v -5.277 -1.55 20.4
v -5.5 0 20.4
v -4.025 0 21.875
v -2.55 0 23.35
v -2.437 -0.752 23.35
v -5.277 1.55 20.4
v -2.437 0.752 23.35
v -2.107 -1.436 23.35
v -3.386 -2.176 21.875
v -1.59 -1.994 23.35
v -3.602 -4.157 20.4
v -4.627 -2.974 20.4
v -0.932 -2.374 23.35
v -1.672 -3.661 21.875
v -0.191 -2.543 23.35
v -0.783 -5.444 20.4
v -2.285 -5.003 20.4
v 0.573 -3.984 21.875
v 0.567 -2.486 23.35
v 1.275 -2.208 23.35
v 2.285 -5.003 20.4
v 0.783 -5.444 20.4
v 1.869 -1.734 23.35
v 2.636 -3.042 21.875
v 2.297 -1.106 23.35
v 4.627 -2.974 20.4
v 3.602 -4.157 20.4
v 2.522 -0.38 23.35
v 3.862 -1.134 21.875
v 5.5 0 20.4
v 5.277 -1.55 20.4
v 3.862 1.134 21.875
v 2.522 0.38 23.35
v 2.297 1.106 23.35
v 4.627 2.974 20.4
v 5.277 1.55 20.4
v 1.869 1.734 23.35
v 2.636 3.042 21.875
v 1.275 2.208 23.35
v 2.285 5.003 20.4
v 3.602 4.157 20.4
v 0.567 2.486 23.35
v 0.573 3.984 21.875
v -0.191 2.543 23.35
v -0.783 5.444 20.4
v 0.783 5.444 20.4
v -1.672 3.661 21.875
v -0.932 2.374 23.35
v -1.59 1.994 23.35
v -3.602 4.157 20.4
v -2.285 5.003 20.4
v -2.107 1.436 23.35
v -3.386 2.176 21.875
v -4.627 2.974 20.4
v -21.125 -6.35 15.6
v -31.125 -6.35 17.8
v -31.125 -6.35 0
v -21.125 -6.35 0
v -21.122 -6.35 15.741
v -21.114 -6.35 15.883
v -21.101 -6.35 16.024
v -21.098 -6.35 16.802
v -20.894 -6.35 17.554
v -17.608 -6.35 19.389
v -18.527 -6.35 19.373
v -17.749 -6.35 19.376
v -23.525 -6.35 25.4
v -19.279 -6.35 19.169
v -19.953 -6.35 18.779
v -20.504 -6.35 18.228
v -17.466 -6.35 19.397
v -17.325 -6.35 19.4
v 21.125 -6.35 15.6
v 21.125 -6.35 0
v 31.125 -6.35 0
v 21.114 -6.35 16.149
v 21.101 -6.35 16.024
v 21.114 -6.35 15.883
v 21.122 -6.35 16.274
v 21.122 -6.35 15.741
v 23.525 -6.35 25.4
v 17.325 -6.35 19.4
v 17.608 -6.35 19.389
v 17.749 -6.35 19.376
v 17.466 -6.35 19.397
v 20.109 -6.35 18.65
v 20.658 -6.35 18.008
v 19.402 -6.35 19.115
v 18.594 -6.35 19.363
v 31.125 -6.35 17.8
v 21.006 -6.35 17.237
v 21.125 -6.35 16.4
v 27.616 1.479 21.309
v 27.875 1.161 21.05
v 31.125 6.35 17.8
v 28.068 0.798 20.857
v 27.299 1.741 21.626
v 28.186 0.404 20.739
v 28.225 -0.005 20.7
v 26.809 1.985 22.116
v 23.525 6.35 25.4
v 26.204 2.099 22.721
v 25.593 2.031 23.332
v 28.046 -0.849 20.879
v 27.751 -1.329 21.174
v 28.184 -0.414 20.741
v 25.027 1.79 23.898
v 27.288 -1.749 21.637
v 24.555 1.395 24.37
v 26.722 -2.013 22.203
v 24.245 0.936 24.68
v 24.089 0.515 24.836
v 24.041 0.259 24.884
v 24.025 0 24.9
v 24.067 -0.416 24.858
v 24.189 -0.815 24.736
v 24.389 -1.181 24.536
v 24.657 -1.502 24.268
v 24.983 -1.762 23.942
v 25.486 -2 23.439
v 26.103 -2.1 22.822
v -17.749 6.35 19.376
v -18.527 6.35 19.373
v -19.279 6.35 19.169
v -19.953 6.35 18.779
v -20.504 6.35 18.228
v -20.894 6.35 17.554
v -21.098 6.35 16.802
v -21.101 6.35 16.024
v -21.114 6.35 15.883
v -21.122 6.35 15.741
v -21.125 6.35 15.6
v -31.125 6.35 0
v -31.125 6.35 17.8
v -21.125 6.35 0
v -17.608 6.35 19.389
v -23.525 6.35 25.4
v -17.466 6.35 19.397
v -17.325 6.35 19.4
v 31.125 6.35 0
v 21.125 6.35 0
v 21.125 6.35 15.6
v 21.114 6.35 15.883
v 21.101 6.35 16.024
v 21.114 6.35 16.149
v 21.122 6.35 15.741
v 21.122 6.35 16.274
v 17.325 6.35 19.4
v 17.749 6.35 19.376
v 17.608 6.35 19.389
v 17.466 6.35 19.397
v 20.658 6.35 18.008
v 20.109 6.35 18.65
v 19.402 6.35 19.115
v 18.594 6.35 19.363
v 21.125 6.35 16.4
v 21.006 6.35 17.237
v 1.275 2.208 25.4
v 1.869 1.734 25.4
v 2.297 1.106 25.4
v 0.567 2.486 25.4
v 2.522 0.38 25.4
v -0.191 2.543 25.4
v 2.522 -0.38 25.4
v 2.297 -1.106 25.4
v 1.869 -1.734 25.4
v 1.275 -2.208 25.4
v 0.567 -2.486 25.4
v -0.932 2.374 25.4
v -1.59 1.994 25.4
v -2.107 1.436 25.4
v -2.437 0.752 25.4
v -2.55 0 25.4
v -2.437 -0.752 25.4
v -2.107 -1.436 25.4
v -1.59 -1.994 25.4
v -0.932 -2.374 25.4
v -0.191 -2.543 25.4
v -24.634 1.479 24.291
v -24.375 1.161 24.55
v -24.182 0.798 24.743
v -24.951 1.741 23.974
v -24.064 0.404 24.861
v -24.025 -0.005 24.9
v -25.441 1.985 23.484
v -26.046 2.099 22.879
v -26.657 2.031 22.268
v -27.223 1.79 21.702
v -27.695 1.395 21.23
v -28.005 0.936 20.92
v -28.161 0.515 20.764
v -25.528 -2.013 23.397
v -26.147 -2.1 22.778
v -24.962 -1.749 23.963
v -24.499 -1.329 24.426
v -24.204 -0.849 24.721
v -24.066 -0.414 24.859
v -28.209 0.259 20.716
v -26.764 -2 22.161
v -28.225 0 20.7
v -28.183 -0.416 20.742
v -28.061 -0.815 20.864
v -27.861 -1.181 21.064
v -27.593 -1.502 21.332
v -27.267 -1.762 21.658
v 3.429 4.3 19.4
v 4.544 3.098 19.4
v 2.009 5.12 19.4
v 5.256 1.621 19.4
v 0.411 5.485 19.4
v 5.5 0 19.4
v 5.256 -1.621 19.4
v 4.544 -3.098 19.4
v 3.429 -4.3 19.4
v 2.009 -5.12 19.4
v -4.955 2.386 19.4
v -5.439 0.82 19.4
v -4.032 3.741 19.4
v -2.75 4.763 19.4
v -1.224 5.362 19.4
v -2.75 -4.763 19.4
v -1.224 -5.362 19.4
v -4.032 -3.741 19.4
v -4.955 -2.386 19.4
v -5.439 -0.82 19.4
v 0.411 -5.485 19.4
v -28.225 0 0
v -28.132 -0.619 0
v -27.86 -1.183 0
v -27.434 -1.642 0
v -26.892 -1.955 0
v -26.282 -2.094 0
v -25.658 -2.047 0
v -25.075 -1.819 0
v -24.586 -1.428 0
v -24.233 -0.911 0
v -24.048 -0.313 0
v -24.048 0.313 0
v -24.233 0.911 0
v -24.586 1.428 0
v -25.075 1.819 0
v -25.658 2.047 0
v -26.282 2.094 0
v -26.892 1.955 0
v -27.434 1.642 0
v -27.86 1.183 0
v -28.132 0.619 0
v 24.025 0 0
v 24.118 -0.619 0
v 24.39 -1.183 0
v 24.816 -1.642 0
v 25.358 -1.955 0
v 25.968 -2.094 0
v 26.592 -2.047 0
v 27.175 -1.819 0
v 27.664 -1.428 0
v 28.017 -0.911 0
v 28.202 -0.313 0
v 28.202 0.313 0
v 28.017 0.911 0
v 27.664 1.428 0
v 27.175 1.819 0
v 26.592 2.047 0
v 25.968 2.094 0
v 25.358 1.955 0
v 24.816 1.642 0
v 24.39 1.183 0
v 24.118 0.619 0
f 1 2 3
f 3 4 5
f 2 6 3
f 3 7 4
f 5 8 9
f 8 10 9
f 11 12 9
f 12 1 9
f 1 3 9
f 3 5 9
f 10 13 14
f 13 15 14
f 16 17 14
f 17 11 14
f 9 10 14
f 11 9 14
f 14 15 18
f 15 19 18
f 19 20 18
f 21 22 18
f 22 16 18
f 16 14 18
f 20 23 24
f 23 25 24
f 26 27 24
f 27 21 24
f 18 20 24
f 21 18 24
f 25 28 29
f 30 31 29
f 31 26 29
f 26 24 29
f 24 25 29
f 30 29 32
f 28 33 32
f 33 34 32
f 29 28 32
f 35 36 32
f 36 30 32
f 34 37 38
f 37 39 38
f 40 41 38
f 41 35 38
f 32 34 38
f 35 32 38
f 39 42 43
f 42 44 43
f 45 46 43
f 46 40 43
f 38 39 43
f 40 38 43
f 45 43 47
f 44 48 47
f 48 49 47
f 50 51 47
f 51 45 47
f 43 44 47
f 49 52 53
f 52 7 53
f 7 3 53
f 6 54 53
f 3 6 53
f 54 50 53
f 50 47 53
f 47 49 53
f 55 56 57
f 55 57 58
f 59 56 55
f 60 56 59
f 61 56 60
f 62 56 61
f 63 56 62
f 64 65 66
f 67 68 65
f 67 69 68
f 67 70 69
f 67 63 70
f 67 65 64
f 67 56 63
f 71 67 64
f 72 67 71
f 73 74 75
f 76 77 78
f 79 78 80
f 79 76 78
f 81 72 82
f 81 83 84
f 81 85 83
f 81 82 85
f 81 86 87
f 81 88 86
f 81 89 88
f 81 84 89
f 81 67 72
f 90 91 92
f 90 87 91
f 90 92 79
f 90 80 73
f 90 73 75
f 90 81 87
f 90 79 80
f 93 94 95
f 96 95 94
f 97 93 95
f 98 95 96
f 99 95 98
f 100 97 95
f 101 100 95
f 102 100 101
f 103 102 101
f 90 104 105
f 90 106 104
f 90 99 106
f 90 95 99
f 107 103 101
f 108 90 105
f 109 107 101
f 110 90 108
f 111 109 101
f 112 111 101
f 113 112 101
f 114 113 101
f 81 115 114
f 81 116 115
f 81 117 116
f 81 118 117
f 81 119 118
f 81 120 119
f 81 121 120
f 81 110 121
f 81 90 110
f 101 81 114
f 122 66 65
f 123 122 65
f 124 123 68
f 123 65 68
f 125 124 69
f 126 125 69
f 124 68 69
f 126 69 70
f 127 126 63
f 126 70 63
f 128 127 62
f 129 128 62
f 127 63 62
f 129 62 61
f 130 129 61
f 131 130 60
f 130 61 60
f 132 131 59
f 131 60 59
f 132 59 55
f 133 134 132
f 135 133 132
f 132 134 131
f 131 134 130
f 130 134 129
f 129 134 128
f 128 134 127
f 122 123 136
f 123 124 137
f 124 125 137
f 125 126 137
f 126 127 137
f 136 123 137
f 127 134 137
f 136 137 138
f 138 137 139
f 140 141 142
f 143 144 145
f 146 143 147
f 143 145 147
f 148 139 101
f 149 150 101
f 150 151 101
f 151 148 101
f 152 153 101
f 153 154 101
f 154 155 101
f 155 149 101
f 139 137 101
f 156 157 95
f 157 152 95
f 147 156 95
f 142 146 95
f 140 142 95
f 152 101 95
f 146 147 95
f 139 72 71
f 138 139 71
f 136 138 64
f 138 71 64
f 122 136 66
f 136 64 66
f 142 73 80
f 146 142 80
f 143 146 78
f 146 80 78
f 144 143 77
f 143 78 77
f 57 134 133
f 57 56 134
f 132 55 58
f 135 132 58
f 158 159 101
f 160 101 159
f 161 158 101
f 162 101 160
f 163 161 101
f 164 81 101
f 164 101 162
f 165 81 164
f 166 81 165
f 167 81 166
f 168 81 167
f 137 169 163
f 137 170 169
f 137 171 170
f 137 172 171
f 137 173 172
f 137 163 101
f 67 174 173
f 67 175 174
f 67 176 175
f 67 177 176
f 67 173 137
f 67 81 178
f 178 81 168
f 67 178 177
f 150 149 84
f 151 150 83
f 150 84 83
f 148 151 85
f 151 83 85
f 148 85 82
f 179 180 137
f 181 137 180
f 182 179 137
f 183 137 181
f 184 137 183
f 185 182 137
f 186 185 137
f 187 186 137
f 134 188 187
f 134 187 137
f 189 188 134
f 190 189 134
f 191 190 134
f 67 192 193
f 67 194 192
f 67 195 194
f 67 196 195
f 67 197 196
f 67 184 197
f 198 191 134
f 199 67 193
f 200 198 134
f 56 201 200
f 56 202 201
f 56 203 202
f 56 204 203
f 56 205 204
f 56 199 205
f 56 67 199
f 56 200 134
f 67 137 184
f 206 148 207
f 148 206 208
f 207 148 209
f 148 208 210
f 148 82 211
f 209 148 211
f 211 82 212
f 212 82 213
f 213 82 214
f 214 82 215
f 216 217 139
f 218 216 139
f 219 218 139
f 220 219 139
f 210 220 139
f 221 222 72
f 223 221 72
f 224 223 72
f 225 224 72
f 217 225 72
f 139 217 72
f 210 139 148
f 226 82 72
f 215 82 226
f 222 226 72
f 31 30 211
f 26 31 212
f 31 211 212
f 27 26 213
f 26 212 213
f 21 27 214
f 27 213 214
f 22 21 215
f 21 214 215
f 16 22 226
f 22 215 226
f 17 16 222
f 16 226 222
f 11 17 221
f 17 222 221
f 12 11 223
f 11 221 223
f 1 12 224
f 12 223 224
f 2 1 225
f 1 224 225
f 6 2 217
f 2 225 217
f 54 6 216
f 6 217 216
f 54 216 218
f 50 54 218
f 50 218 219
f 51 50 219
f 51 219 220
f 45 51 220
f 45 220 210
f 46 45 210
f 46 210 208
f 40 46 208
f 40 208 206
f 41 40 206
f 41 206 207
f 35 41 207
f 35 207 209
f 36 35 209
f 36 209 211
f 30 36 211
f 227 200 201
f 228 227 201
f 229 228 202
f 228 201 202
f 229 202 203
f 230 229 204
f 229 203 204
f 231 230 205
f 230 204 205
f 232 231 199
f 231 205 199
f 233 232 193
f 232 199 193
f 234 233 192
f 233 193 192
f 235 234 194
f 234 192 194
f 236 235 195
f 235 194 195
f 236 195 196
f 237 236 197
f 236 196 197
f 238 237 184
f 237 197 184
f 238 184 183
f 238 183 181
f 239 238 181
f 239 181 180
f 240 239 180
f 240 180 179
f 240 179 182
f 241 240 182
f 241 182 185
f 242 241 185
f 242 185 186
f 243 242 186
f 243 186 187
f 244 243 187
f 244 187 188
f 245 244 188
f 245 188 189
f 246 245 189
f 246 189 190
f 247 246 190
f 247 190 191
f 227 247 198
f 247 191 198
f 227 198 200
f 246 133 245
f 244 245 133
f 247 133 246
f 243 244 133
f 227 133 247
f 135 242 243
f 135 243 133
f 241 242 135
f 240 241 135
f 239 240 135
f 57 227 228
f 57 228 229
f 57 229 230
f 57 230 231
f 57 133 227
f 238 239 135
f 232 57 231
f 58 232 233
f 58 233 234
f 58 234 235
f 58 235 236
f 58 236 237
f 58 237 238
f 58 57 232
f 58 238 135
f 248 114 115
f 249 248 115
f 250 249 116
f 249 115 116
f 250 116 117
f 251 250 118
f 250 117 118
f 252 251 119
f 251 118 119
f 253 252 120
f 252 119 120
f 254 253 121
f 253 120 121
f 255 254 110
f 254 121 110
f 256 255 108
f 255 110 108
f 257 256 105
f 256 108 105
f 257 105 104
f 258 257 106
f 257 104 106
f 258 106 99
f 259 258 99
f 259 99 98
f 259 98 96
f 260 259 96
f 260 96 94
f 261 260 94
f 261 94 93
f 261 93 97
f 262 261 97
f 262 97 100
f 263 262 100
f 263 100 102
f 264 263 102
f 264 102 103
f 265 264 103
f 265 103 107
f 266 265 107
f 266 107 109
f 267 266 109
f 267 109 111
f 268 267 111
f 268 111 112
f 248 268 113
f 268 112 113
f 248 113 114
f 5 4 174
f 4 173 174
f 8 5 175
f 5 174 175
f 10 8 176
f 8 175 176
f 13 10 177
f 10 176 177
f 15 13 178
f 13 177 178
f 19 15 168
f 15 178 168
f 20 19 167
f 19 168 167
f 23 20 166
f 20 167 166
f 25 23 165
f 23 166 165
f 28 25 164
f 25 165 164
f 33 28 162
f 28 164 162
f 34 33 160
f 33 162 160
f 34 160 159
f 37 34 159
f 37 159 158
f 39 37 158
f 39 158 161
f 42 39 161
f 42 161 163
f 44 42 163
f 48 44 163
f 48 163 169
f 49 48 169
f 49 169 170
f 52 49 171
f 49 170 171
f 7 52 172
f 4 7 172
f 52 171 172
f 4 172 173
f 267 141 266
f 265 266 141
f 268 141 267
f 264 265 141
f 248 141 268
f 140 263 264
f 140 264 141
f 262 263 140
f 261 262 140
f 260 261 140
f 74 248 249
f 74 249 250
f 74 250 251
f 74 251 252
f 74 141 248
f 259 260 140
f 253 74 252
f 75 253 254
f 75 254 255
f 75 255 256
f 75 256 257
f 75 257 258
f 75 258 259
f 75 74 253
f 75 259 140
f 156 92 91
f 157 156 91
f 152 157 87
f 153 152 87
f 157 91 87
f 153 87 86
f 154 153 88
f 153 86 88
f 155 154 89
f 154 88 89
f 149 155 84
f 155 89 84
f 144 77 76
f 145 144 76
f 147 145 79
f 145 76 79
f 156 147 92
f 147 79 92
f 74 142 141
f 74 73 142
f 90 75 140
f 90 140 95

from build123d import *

# Parameters (mm, degrees)
F1_DEPTH        = 6.35
F4_D            = 4.2
F6_DEPTH        = 12.701
F8_DEPTH        = 12.701
F2_R            = 5.5
F9_DEPTH        = 1
F11_D           = 5.1
F11_CSINK_D     = 11
F11_CSINK_ANGLE = 90


with BuildPart() as f1:
    # F0 (on Front) → F1 (new body, symmetric)
    with BuildSketch(Plane.XZ):
        Polygon((-31.125, 17.8), (-31.125, 0), (-21.125, 0), (-21.125, 11.8), (-13.525, 19.4), (13.525, 19.4), (21.125, 11.8), (21.125, 0), (31.125, 0), (31.125, 17.8), (23.525, 25.4), (-23.525, 25.4), align=None)
    extrude(amount=F1_DEPTH, both=True)

    # F4 (through all)
    with Locations(Plane(origin=(0, 0, 0), x_dir=(1, 0, 0), z_dir=(0, 0, -1))):
        with Locations((-26.125, 0), (26.125, 0)):
            Hole(F4_D / 2)

    # F5 (on face) → F6 (cut, through all)
    with BuildSketch(Plane.XZ.offset(6.35)):
        with BuildLine():
            ThreePointArc((-14.6379942315, 18.2870057685), (-15.870802957, 19.1107422235), (-17.325, 19.4))
            ThreePointArc((-17.325, 19.4), (-20.0120057685, 18.2870057685), (-21.125, 15.6))
            ThreePointArc((-21.125, 15.6), (-20.8357422235, 14.145802957), (-20.0120057685, 12.9129942315))
            Line((-20.0120057685, 12.9129942315), (-14.6379942315, 18.2870057685))
        make_face()
        with BuildLine():
            Line((-13.525, 19.4), (-17.325, 19.4))
            ThreePointArc((-17.325, 19.4), (-15.870802957, 19.1107422235), (-14.6379942315, 18.2870057685))
            Line((-14.6379942315, 18.2870057685), (-13.525, 19.4))
        make_face()
        with BuildLine():
            ThreePointArc((-20.0120057685, 12.9129942315), (-20.8357422235, 14.145802957), (-21.125, 15.6))
            Line((-21.125, 15.6), (-21.125, 11.8))
            Line((-21.125, 11.8), (-20.0120057685, 12.9129942315))
        make_face()
        with BuildLine():
            ThreePointArc((21.125, 15.6), (20.0120057685, 18.2870057685), (17.325, 19.4))
            ThreePointArc((17.325, 19.4), (15.870802957, 19.1107422235), (14.6379942315, 18.2870057685))
            Line((14.6379942315, 18.2870057685), (20.0120057685, 12.9129942315))
            ThreePointArc((20.0120057685, 12.9129942315), (20.8357422235, 14.145802957), (21.125, 15.6))
        make_face()
        with BuildLine():
            Line((17.325, 19.4), (13.525, 19.4))
            Line((13.525, 19.4), (14.6379942315, 18.2870057685))
            ThreePointArc((14.6379942315, 18.2870057685), (15.870802957, 19.1107422235), (17.325, 19.4))
        make_face()
        with BuildLine():
            Line((21.125, 11.8), (21.125, 15.6))
            ThreePointArc((21.125, 15.6), (20.8357422235, 14.145802957), (20.0120057685, 12.9129942315))
            Line((20.0120057685, 12.9129942315), (21.125, 11.8))
        make_face()
    extrude(amount=-F6_DEPTH, mode=Mode.SUBTRACT)

    # F7 (on face) → F8 (cut, through all)
    with BuildSketch(Plane.XZ.offset(6.35)):
        with BuildLine():
            ThreePointArc((-21.1013054614, 16.0236945386), (-20.0120057685, 18.2870057685), (-17.7486945386, 19.3763054614))
            ThreePointArc((-17.7486945386, 19.3763054614), (-20.2463203436, 18.5213203436), (-21.1013054614, 16.0236945386))
        make_face()
        with BuildLine():
            ThreePointArc((21.125, 16.4), (20.1088200039, 18.6504351117), (17.7486945386, 19.3763054614))
            ThreePointArc((17.7486945386, 19.3763054614), (20.0120057685, 18.2870057685), (21.1013054614, 16.0236945386))
            ThreePointArc((21.1013054614, 16.0236945386), (21.1190705055, 16.2114746493), (21.125, 16.4))
        make_face()
    extrude(amount=-F8_DEPTH, mode=Mode.SUBTRACT)

    # F2 (on face) → F9 (cut)
    with BuildSketch(Plane(origin=(0, 0, 19.4), x_dir=(1, 0, 0), z_dir=(0, 0, -1))):
        Circle(F2_R)
    extrude(amount=-F9_DEPTH, mode=Mode.SUBTRACT)

    # F11 (through all)
    with Locations(Plane(origin=(0, 0, 20.4), x_dir=(1, 0, 0), z_dir=(0, 0, -1))):
        with Locations((0, 0)):
            CounterSinkHole(F11_D / 2, F11_CSINK_D / 2, counter_sink_angle=F11_CSINK_ANGLE)


solid = f1.part
